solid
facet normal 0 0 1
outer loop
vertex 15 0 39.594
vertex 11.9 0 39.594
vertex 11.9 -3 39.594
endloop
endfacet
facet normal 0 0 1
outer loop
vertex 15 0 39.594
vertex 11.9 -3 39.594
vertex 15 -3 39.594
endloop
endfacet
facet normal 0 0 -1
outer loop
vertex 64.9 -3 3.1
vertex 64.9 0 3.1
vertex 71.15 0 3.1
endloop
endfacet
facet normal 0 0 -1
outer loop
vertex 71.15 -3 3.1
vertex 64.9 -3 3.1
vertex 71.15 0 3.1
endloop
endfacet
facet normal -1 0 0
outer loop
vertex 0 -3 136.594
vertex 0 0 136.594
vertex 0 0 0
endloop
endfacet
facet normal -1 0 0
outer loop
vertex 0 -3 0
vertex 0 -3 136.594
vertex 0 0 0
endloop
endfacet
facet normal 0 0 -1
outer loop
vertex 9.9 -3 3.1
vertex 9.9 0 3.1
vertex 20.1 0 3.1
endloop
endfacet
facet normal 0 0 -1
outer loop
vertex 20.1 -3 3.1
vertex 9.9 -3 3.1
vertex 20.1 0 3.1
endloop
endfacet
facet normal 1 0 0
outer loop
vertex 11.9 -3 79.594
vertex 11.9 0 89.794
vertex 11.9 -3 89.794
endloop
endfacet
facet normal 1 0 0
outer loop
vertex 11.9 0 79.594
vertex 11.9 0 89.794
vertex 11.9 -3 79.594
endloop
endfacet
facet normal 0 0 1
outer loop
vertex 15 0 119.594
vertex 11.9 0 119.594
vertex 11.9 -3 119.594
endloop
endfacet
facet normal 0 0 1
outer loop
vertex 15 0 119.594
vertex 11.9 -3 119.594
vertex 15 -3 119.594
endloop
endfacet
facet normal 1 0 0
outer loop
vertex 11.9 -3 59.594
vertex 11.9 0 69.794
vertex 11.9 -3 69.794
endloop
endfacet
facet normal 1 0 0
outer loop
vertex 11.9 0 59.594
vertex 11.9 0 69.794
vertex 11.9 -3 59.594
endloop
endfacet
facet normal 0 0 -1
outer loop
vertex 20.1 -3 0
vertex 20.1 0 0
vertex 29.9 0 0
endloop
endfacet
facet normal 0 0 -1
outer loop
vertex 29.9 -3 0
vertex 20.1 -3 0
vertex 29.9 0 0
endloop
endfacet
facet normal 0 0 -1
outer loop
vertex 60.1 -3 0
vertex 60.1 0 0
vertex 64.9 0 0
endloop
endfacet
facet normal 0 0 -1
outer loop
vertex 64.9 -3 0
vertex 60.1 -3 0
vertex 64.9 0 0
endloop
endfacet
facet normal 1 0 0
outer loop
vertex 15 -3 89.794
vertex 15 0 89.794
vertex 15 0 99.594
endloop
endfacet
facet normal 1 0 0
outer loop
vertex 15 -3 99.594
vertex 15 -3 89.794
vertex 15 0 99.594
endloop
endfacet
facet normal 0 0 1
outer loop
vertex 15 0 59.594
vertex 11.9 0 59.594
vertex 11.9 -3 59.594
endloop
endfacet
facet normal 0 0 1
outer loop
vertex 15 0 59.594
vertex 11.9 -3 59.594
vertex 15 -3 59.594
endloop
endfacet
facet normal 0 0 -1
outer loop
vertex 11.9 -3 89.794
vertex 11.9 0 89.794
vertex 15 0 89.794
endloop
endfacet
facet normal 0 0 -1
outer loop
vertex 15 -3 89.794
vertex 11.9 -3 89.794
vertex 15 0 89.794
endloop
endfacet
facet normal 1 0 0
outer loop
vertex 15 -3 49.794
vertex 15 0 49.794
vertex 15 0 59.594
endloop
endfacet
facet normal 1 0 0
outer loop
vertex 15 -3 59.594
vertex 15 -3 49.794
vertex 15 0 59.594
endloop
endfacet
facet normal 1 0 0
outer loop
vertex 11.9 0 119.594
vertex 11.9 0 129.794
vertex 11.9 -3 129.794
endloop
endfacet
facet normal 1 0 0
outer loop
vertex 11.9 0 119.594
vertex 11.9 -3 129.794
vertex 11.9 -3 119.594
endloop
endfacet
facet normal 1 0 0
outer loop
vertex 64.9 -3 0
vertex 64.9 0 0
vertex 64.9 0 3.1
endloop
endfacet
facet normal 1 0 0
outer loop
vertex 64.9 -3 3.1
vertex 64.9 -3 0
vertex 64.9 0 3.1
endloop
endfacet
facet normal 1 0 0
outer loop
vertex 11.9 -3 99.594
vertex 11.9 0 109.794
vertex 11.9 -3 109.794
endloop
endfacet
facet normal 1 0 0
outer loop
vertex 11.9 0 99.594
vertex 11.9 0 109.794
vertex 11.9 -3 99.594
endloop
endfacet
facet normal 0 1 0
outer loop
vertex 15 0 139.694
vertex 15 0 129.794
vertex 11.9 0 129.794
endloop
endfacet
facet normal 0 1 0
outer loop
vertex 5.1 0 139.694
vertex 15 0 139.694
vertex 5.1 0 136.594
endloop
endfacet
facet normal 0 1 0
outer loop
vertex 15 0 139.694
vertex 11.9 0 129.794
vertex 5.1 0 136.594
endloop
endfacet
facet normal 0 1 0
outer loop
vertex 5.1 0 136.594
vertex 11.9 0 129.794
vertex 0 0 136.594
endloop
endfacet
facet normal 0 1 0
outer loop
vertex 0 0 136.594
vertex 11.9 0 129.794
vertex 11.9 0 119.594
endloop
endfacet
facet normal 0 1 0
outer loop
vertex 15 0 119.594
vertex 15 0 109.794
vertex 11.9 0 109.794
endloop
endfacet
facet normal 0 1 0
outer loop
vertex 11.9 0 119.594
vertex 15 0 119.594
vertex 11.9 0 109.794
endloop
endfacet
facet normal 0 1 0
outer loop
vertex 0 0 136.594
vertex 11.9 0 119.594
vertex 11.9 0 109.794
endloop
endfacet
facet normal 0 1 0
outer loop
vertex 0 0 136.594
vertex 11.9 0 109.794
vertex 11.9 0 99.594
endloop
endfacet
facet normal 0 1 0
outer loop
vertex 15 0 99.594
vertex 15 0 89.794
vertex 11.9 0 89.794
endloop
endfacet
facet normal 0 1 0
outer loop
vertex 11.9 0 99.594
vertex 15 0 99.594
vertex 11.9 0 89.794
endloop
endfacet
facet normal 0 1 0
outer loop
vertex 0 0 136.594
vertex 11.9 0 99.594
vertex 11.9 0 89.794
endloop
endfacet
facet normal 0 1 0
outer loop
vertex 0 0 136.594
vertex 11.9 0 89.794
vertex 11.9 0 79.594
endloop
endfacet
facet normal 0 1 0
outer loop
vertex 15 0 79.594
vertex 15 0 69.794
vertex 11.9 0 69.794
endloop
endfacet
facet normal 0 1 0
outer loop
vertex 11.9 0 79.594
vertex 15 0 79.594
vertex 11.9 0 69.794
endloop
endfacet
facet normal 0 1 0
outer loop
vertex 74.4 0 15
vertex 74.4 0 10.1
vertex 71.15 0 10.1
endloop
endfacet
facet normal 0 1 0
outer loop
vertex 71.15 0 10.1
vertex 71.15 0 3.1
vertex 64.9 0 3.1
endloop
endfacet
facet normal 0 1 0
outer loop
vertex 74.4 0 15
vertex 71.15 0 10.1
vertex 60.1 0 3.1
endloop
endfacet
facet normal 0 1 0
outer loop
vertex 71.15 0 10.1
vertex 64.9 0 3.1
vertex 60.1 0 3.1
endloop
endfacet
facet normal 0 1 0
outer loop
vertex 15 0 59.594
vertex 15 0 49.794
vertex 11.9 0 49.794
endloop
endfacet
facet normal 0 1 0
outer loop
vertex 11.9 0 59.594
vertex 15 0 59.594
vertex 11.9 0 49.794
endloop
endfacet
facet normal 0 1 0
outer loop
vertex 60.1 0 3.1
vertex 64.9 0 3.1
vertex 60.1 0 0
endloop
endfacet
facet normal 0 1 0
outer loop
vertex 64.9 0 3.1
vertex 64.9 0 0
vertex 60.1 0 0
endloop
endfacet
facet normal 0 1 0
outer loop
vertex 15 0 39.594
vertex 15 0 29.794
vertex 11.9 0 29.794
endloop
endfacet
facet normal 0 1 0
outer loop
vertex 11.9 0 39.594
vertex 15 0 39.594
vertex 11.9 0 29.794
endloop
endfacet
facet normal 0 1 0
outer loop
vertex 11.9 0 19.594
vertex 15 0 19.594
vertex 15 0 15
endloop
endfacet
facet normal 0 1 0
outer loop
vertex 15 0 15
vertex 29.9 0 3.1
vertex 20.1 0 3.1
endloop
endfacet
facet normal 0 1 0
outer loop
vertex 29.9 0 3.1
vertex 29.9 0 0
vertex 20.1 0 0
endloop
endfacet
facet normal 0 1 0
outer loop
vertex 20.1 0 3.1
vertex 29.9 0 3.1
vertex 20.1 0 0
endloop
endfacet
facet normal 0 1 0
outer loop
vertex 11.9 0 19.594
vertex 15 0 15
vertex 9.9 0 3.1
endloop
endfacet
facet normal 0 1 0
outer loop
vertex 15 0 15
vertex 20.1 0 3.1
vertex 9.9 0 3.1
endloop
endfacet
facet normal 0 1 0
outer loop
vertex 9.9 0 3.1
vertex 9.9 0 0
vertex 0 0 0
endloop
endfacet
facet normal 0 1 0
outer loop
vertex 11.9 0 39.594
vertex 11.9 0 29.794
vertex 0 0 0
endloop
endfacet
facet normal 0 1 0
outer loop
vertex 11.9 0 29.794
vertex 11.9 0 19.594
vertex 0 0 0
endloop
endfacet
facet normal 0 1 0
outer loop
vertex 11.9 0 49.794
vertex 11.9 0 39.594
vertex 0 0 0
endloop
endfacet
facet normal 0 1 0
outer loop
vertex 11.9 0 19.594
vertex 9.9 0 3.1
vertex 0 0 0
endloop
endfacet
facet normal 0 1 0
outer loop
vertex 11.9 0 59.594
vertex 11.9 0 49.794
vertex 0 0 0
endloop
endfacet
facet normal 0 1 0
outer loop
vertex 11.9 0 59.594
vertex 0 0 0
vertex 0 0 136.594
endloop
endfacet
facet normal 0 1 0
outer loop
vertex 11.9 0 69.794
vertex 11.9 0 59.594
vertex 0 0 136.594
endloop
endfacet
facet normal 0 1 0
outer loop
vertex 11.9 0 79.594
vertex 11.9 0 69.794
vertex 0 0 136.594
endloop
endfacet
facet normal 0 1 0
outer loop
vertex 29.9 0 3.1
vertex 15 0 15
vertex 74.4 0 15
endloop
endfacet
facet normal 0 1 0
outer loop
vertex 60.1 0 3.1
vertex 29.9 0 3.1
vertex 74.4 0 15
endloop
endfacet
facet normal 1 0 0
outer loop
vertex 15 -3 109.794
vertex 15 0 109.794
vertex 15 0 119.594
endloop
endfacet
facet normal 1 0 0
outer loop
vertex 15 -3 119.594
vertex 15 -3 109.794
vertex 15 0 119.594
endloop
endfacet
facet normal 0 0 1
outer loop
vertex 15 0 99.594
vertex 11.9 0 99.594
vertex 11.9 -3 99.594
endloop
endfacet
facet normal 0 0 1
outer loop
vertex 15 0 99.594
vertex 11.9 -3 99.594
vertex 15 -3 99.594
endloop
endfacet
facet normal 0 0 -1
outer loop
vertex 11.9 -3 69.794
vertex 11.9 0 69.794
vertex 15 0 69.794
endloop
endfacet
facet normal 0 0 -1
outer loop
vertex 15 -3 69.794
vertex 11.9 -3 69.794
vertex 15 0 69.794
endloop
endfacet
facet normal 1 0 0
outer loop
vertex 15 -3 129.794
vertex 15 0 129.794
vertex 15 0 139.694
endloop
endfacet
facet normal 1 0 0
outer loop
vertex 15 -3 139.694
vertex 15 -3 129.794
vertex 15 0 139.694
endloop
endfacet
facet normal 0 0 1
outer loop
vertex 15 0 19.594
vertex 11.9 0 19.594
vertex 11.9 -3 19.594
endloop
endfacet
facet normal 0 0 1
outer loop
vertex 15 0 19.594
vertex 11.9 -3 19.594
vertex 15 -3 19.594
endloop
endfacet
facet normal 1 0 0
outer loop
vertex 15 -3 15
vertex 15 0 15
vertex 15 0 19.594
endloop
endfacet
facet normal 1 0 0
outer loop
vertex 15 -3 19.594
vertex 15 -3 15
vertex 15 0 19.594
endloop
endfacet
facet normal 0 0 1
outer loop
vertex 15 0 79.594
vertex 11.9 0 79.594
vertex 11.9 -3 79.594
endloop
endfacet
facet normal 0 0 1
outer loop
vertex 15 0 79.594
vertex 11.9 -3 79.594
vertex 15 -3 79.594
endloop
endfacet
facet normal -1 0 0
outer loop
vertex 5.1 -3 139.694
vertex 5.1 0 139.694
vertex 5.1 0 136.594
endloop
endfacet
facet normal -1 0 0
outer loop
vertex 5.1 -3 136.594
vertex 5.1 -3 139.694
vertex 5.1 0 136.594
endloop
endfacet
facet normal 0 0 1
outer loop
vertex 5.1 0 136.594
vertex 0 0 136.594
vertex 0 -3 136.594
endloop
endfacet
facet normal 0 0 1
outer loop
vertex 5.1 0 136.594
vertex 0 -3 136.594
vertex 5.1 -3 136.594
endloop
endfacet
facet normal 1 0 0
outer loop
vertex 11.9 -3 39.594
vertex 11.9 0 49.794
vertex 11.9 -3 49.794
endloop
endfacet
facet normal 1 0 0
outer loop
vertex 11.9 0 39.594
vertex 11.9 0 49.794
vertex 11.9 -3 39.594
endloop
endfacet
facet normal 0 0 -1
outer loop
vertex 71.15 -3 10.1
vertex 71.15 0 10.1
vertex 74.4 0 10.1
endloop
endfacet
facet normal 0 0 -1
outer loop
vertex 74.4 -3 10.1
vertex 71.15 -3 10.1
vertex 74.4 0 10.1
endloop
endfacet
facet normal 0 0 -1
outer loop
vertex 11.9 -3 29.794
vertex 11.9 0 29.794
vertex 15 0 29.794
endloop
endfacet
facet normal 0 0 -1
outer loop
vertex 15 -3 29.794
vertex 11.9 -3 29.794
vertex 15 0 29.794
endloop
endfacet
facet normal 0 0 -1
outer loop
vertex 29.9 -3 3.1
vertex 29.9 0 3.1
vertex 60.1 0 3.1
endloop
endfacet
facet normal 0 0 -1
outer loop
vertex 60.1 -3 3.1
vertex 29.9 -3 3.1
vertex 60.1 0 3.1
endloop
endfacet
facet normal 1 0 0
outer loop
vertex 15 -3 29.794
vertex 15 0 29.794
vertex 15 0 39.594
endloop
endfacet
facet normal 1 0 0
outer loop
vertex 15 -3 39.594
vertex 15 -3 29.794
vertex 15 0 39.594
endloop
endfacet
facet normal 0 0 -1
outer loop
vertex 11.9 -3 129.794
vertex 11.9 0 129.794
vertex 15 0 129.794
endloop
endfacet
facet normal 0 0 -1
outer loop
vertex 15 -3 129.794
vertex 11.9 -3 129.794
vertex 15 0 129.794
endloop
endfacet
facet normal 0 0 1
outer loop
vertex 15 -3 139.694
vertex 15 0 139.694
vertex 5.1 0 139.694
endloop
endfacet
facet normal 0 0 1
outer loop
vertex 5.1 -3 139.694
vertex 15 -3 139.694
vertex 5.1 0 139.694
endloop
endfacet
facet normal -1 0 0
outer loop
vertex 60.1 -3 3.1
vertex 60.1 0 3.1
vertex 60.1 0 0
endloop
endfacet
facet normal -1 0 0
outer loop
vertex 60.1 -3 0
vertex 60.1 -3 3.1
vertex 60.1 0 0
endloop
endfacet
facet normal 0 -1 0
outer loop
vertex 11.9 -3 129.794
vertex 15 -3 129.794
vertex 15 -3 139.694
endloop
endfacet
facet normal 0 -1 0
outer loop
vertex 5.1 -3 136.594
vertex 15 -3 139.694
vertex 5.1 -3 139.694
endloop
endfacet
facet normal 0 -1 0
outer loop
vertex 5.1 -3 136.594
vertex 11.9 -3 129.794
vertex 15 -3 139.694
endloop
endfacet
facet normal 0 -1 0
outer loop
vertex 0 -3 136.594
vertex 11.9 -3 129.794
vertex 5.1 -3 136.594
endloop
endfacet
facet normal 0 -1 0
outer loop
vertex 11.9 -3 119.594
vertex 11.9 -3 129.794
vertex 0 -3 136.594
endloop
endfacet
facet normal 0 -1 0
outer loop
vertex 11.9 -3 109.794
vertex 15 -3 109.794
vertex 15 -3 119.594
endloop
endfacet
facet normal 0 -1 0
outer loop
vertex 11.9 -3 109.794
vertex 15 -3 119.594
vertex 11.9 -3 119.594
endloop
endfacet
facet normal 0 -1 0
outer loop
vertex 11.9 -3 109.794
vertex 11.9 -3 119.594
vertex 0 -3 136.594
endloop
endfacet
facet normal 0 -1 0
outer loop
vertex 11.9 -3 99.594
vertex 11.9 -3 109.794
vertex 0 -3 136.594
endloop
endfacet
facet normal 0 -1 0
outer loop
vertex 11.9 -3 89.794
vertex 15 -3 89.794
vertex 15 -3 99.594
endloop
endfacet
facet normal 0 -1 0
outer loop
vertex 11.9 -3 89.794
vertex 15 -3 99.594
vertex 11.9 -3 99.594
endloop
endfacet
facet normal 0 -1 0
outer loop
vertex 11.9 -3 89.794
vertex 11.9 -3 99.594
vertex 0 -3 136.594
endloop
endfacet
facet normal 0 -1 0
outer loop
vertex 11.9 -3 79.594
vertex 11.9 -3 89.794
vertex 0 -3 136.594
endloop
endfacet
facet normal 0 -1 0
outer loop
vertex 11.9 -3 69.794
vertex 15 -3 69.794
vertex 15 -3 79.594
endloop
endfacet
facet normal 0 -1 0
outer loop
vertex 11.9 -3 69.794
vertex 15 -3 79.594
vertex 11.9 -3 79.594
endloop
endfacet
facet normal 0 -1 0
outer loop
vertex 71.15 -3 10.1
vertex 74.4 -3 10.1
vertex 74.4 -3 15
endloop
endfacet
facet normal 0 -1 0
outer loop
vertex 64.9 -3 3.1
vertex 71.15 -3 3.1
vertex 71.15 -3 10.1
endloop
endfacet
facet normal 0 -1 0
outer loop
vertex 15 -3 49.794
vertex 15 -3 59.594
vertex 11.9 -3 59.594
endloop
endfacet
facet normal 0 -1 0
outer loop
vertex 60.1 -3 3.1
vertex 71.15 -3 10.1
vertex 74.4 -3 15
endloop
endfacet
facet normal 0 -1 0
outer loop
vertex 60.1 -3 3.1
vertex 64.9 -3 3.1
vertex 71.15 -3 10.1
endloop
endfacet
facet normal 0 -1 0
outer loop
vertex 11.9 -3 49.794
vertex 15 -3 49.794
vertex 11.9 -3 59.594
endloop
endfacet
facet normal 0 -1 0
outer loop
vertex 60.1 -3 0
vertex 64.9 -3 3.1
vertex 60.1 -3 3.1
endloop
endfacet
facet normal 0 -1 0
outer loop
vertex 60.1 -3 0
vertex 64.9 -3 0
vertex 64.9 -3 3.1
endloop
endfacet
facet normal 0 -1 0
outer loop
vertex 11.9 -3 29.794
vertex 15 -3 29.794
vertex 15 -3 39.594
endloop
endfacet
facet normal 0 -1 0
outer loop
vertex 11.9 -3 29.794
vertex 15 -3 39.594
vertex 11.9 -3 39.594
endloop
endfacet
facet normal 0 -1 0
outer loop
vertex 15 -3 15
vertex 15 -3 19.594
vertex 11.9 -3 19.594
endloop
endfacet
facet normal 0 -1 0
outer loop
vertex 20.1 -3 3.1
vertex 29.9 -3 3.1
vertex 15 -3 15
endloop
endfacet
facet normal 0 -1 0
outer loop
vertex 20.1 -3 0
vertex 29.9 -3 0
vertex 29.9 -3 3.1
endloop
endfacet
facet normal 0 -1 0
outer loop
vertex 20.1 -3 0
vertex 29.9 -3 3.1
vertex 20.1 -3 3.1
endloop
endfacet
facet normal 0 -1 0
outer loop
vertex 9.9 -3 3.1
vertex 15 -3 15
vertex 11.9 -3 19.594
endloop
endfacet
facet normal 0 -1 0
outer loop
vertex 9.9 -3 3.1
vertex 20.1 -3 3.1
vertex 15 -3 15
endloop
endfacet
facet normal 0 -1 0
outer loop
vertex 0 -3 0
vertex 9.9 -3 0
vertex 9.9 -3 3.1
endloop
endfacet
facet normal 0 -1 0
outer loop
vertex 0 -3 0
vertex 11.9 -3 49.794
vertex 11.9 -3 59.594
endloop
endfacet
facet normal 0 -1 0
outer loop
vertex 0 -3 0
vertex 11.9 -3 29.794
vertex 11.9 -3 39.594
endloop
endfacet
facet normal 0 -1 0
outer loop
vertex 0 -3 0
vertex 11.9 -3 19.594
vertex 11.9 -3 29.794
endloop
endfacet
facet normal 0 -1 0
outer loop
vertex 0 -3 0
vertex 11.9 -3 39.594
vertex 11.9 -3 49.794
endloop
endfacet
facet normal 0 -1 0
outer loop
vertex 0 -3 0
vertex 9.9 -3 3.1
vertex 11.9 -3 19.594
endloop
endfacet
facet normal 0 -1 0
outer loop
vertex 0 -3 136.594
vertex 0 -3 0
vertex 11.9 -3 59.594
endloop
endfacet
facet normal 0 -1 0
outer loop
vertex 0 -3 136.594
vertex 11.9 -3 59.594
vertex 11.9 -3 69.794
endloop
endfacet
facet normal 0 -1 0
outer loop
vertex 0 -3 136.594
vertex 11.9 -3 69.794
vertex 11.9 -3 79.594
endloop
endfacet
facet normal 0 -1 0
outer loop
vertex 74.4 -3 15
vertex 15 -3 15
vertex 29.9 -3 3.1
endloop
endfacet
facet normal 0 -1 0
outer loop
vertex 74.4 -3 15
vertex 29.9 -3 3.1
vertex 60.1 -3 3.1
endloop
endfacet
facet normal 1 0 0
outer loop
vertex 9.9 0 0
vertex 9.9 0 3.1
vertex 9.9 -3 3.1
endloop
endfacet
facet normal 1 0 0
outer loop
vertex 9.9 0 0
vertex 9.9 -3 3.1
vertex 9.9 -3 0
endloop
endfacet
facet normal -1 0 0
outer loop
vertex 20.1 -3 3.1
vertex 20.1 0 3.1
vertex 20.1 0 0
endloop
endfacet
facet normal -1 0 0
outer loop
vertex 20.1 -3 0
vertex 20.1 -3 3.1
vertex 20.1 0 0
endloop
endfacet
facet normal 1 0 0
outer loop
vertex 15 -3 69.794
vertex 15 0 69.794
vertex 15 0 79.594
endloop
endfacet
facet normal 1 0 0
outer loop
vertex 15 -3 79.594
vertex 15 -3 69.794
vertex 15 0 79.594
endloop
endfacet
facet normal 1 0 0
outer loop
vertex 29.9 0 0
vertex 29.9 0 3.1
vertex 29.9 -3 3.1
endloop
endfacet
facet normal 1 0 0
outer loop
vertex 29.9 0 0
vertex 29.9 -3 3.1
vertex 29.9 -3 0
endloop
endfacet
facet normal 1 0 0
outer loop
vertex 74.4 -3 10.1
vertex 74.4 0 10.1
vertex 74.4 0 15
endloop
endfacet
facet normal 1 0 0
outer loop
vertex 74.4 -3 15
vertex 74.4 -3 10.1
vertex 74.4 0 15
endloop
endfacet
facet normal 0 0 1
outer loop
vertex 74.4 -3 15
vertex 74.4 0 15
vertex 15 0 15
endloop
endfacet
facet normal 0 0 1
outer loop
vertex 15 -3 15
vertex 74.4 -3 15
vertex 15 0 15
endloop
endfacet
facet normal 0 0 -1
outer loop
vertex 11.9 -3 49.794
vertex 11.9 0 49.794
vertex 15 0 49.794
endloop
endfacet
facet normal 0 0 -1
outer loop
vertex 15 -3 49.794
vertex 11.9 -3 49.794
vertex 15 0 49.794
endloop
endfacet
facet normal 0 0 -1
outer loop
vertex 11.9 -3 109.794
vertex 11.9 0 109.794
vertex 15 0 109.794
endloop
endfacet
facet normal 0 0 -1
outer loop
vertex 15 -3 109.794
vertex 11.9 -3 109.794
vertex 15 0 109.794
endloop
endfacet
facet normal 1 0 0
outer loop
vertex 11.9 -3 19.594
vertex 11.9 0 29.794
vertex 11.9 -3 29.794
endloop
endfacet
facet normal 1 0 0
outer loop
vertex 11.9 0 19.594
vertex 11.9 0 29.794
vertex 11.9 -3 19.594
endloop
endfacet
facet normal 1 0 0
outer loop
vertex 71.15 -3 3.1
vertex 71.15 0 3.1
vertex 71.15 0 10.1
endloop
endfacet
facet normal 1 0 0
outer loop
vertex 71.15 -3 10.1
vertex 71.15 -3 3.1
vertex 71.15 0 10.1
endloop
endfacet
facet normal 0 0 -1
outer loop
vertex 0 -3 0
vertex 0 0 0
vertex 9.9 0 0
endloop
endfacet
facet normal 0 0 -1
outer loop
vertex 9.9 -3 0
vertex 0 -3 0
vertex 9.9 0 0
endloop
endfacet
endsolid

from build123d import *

# Parameters (mm, degrees)
BOSS_EXTRUDE1_DEPTH = 3
SKETCH3_W           = 5.2
SKETCH3_H           = 3.2
SKETCH3_W_2         = 10.2
SKETCH3_W_3         = 30.2
SKETCH3_W_4         = 3.2
SKETCH3_H_2         = 10.2
CUT_EXTRUDE1_DEPTH  = 4


with BuildPart() as part:
    # Sketch1 → Boss-Extrude1 (new body)
    with BuildSketch(Plane(origin=(0, 0, 0), x_dir=(1, 0, 0), z_dir=(0, 1, 0))):
        Polygon((0, 0), (75, 0), (75, -15), (15, -15), (15, -139.694434203), (0, -139.694434203), align=None)
    extrude(amount=-BOSS_EXTRUDE1_DEPTH)

    # Sketch3 → Cut-Extrude1 (cut, through all)
    with BuildSketch(Plane(origin=(0, 0, 0), x_dir=(1, 0, 0), z_dir=(0, 1, 0))):
        with Locations((2.5, -138.194434203)):
            Rectangle(SKETCH3_W, SKETCH3_H)
        with Locations((15, -1.5)):
            Rectangle(SKETCH3_W_2, SKETCH3_H)
        with Locations((45, -1.5)):
            Rectangle(SKETCH3_W_3, SKETCH3_H)
        with Locations((13.5, -104.694434203)):
            Rectangle(SKETCH3_W_4, SKETCH3_H_2)
        with Locations((13.5, -64.694434203)):
            Rectangle(SKETCH3_W_4, SKETCH3_H_2)
        with Locations((13.5, -124.694434203)):
            Rectangle(SKETCH3_W_4, SKETCH3_H_2)
        with Locations((13.5, -44.694434203)):
            Rectangle(SKETCH3_W_4, SKETCH3_H_2)
        with Locations((13.5, -24.694434203)):
            Rectangle(SKETCH3_W_4, SKETCH3_H_2)
        with Locations((13.5, -84.694434203)):
            Rectangle(SKETCH3_W_4, SKETCH3_H_2)
        Polygon((75.1, 0.1), (64.9, 0.1), (64.9, -3.1), (71.15, -3.1), (71.15, -10.1), (74.4, -10.1), (74.4, -15.1), (75.1, -15.1), align=None)
    extrude(amount=-CUT_EXTRUDE1_DEPTH, mode=Mode.SUBTRACT)


solid = part.part
